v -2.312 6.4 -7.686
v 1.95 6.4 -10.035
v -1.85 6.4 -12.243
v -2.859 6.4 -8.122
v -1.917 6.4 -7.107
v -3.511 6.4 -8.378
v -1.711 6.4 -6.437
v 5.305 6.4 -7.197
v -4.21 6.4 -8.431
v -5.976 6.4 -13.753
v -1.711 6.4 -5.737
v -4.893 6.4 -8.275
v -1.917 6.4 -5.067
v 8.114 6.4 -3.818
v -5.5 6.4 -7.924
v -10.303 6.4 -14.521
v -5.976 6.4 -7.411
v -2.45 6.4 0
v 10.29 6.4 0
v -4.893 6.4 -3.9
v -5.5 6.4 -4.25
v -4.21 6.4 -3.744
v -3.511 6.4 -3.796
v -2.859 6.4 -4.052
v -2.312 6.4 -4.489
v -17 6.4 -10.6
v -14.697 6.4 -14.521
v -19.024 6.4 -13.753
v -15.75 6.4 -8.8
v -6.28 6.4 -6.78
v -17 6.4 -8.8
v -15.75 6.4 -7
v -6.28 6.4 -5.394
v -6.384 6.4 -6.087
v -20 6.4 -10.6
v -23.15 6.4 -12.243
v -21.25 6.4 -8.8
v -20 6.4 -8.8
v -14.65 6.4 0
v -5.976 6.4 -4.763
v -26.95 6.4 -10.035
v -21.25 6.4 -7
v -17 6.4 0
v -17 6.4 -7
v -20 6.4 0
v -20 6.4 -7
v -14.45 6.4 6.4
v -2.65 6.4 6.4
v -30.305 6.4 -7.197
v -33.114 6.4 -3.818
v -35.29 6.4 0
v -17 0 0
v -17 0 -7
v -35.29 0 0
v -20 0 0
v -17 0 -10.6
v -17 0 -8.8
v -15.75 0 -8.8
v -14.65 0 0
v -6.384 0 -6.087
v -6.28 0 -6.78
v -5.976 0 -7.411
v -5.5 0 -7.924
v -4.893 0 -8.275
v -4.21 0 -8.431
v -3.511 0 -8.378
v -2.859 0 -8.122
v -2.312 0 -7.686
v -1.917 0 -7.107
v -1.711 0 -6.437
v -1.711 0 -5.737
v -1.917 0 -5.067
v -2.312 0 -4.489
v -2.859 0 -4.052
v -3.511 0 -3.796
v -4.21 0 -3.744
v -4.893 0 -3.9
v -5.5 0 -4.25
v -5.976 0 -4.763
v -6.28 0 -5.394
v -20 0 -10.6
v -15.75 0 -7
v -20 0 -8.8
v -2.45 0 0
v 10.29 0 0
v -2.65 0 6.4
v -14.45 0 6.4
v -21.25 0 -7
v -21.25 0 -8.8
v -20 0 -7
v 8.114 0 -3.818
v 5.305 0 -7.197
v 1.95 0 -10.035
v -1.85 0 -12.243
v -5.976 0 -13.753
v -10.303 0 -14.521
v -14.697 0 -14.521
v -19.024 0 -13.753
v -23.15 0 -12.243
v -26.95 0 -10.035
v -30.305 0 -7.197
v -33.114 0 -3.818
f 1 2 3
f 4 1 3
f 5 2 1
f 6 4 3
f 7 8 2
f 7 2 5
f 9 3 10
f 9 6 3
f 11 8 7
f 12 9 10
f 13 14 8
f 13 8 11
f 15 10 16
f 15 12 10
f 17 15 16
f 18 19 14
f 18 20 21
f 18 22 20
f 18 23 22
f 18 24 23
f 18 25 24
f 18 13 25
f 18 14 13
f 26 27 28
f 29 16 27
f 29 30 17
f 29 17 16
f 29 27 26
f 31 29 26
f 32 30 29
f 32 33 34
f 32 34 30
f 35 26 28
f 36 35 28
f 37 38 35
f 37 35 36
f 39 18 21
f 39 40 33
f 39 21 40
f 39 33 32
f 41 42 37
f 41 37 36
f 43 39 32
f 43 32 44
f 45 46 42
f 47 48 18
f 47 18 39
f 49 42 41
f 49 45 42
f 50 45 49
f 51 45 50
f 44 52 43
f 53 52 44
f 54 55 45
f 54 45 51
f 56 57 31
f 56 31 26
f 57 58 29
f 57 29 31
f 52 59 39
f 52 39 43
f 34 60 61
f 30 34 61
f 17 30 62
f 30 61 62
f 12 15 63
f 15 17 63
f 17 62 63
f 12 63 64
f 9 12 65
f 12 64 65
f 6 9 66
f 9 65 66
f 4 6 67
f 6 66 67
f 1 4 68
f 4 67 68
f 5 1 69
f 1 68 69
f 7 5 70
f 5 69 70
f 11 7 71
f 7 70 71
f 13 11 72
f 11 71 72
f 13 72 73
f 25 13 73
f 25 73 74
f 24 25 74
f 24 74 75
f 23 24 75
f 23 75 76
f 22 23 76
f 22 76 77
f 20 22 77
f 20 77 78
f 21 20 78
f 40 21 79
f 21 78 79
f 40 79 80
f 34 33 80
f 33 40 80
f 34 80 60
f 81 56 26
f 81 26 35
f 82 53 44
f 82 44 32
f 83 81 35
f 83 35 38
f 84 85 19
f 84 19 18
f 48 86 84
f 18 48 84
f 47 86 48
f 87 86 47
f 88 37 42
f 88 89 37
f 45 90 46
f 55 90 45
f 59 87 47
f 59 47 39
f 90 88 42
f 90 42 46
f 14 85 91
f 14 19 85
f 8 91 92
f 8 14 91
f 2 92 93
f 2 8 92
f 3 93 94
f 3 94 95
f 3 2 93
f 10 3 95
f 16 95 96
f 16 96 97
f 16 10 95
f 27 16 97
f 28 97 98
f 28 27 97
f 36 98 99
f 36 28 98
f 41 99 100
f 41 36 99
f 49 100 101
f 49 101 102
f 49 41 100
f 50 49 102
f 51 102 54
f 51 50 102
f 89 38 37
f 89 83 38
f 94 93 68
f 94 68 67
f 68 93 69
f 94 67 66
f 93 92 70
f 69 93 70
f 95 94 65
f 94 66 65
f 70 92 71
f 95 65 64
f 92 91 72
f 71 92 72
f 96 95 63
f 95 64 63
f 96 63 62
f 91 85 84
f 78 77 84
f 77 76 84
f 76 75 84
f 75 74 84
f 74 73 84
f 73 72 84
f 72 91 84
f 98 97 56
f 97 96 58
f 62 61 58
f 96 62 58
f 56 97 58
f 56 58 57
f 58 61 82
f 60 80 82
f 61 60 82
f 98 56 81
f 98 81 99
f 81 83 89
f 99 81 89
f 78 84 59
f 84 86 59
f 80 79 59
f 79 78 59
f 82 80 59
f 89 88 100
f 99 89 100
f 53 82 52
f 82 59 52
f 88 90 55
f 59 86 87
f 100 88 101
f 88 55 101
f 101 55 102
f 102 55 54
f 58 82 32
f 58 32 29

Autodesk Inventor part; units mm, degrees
ref_plane "YZ Plane" through (0, 0, 0) normal (1, 0, 0) x (0, 1, 0)
ref_plane "XZ Plane" through (0, 0, 0) normal (0, 1, 0) x (-1, 0, 0)
ref_plane "XY Plane" through (0, 0, 0) normal (0, 0, 1) x (1, 0, 0)
sketch "Sketch1" plane through (0, 0, 0) normal (0, 1, 0) x (-1, 0, 0)
  line L0 (0, 0) -> (2.35, 0)
  line L1 (2.35, 0) -> (2.65, 6.4)
  line L2 (2.65, 6.4) -> (14.45, 6.4)
  line L3 (14.45, 6.4) -> (14.75, 0)
  line L4 (14.75, 0) -> (17, 0)
  line L5 (17, 0) -> (17, -7)
  line L6 (17, -7) -> (15.75, -7)
  line L7 (15.75, -7) -> (15.75, -8.8)
  line L8 (15.75, -8.8) -> (17, -8.8)
  line L9 (17, -8.8) -> (17, -10.6)
  line L10 (17, -10.6) -> (20, -10.6)
  line L11 (20, -10.6) -> (20, -8.8)
  line L12 (20, -8.8) -> (21.25, -8.8)
  line L13 (21.25, -8.8) -> (21.25, -7)
  line L14 (21.25, -7) -> (20, -7)
  line L15 (20, -7) -> (20, 0)
  line L16 (20, 0) -> (25, 0)
  line L17 (25, 0) -> (25, -15)
  line L18 (25, -15) -> (0, -15)
  line L19 (0, -15) -> (0, 0)
  circle A0 centre (4.0344, -6.0871) radius 2.35
  dimension "d0" = 7
  dimension "d2" = 1.8
  dimension "d3" = 1.8
  dimension "d4" = 3
  dimension "d5" = 1.25
  dimension "d6" = 1.25
  dimension "d7" = 25
  dimension "d8" = 15
  dimension "d9" = 5
  dimension "d10" = 11.8
  dimension "d11" = 12.4
  dimension "d12" = 6.4
  dimension "d14" = 2.25
  dimension "d15" = 4.7
  dimension "d26" = 2.35
extrude "Extrusion1" add sketch "Sketch1" along normal blind 6.4
fillet "Fillet1" radius 2 2 edges at (-25, 3.2, -15) (0, 3.2, -15)
sketch "Sketch2" plane through (0, 6.4, 0) normal (0, 1, 0) x (1, 0, 0)
  line L0 (-25, 13) -> (-25, 0) projected
  line L1 (0, 0) -> (0, 13) projected
  circle A0 centre (-12.5, -10.4574) radius 25.0744
  line L2 (-25, 0) -> (-35.2897, 0)
  line L3 (-25, 0) -> (-25, 11.2791)
  line L4 (0, 0) -> (0, 11.2791)
  line L5 (0, 0) -> (10.2897, 0)
  dimension "d19" = 12.5
extrude "Extrusion2" add sketch "Sketch2" against normal blind 6.4 contours L0 L2 A0 | A0 L5 L1
sketch "Sketch3" plane through (0, 6.4, 0) normal (0, 1, 0) x (1, 0, 0)
  arc A0 (0, 13) -> (-2, 15) centre (-2, 13) ccw projected
  line L0 (-2, 15) -> (-23, 15) projected
  arc A1 (-23, 15) -> (-25, 13) centre (-23, 13) ccw projected
  line L1 (-25, 13) -> (-25, 11.2791) projected
  line L2 (0, 11.2791) -> (0, 13) projected
  circle A2 centre (-12.5, -10.4574) radius 25.0744 projected
  point P0 (0, 0)
extrude "Extrusion3" cut sketch "Sketch3" against normal blind 6.4 contours L2 A2 L1 A1 L0 A0
sketch "Sketch4" plane through (0, 0, 0) normal (0, -1, 0) x (1, 0, 0)
  line L0 (10.2897, 0) -> (-2.35, 0) projected
  line L1 (-2.35, 0) -> (-2.65, 6.4) projected
  line L2 (-14.45, 6.4) -> (-14.75, 0) projected
  line L3 (-14.75, 0) -> (-17, 0) projected
  line L4 (-14.45, 6.4) -> (-14.65, 0)
  line L5 (-14.65, 0) -> (-14.75, 0)
  line L6 (-2.65, 6.4) -> (-2.45, 0)
  line L7 (-2.45, 0) -> (-2.35, 0)
  point P0 (0, 0)
  dimension "d27" = 0.1
  dimension "d28" = 0.1
extrude "Extrusion4" cut sketch "Sketch4" against normal blind 10
properties part number "trzymacz_bowdena"
